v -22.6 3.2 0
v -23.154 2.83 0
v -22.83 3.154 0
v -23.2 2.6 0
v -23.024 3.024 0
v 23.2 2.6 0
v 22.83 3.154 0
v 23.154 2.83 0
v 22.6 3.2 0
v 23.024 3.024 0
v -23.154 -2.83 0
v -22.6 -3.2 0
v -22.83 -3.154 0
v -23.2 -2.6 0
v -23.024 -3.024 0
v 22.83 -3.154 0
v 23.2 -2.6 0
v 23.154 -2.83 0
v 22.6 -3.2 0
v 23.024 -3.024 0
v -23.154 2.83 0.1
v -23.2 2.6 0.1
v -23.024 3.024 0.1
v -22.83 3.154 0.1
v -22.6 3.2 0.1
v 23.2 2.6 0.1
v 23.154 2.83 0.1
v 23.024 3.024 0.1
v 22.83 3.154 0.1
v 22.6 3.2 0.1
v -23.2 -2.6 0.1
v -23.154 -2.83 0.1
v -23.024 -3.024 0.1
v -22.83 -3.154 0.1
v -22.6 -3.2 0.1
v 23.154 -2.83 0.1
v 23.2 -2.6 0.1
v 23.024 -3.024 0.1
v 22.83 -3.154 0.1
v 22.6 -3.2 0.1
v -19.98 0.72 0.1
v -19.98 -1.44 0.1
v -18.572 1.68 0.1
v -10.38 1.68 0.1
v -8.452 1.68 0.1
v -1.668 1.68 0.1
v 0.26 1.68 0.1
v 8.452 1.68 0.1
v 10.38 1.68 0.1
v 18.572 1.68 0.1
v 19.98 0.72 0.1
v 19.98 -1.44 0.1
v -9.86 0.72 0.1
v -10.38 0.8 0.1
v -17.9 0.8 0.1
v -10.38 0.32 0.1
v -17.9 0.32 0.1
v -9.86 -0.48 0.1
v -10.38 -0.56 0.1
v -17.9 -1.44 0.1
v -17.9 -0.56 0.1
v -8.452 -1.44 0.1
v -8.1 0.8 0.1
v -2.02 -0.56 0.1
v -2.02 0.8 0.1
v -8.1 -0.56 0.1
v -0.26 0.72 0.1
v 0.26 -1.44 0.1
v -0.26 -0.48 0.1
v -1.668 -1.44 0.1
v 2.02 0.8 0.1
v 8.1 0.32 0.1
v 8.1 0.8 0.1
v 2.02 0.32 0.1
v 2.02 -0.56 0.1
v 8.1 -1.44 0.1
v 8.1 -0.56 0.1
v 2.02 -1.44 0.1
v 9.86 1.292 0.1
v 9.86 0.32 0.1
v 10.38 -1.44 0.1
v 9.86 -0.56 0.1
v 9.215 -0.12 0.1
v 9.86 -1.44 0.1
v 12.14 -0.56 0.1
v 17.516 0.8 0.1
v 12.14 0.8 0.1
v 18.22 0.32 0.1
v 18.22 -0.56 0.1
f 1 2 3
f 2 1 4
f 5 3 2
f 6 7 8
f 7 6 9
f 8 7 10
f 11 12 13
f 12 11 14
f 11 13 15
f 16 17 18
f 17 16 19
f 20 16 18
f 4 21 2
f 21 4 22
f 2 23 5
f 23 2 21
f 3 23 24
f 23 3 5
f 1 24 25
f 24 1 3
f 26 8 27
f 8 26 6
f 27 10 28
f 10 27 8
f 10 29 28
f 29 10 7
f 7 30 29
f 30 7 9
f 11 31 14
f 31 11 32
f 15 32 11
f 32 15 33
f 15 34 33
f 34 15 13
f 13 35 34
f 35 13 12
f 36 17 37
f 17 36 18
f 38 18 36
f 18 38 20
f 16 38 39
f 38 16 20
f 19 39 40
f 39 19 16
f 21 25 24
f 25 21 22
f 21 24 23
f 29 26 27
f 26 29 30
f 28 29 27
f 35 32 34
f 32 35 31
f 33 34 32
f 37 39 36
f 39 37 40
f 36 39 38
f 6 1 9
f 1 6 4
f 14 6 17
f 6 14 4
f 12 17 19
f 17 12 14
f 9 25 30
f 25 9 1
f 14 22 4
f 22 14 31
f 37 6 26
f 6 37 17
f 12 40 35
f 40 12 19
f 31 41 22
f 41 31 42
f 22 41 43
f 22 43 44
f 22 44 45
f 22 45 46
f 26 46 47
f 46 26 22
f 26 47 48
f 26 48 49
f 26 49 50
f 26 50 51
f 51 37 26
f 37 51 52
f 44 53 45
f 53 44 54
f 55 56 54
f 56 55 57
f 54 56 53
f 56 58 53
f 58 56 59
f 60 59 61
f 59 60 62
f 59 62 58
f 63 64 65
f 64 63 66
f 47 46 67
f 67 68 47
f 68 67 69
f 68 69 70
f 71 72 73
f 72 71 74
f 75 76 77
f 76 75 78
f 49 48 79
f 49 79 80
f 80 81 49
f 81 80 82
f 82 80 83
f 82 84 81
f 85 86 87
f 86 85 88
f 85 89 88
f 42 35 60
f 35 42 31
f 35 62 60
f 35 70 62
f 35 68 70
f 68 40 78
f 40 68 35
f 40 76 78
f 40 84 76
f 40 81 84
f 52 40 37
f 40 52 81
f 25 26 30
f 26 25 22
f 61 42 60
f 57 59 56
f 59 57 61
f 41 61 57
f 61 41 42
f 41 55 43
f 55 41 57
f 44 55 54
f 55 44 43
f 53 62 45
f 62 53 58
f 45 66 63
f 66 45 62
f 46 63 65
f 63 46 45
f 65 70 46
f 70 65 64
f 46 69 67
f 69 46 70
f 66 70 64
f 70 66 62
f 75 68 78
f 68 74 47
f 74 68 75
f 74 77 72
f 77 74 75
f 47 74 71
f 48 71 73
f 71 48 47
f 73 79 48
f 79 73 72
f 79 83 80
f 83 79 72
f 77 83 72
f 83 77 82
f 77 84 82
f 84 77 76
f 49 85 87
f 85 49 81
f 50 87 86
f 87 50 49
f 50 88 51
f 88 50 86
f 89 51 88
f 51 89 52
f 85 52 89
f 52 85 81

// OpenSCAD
// file: ../p/1-4cyli.scad
use <../lib.scad>
function ldraw_lib__1_4cyli() = [
// 0 Cylinder 0.25
// 0 Name: 1-4cyli.dat
// 0 Author: James Jessiman
// 0 !LDRAW_ORG Primitive UPDATE 2012-01
// 0 !LICENSE Licensed under CC BY 2.0 and CC BY 4.0 : see CAreadme.txt
// 
// 0 BFC CERTIFY CCW
  [0,"BFC","CERTIFY"],
  [0,"BFC","CCW"],
// 
// 0 !HISTORY 2002-03-23 [sbliss] Added BFC statement.
// 0 !HISTORY 2002-04-25 [PTadmin] Official Update 2002-02
// 0 !HISTORY 2007-06-22 [PTadmin] Header formatted for Contributor Agreement
// 0 !HISTORY 2008-07-01 [PTadmin] Official Update 2008-01
// 0 !HISTORY 2012-02-16 [Philo] Changed to CCW
// 0 !HISTORY 2012-03-30 [PTadmin] Official Update 2012-01
// 
// 
// 4 16 1 1 0 0.9239 1 0.3827 0.9239 0 0.3827 1 0 0
  [4,16,1,1,0,0.9239,1,0.3827,0.9239,0,0.3827,1,0,0],
// 5 24 1 0 0 1 1 0 0.9239 0 0.3827 1 0 -1
  [5,24,1,0,0,1,1,0,0.9239,0,0.3827,1,0,-1],
// 4 16 0.9239 1 0.3827 0.7071 1 0.7071 0.7071 0 0.7071 0.9239 0 0.3827
  [4,16,0.9239,1,0.3827,0.7071,1,0.7071,0.7071,0,0.7071,0.9239,0,0.3827],
// 5 24 0.9239 0 0.3827 0.9239 1 0.3827 0.7071 0 0.7071 1 0 0
  [5,24,0.9239,0,0.3827,0.9239,1,0.3827,0.7071,0,0.7071,1,0,0],
// 4 16 0.7071 1 0.7071 0.3827 1 0.9239 0.3827 0 0.9239 0.7071 0 0.7071
  [4,16,0.7071,1,0.7071,0.3827,1,0.9239,0.3827,0,0.9239,0.7071,0,0.7071],
// 5 24 0.7071 0 0.7071 0.7071 1 0.7071 0.3827 0 0.9239 0.9239 0 0.3827
  [5,24,0.7071,0,0.7071,0.7071,1,0.7071,0.3827,0,0.9239,0.9239,0,0.3827],
// 4 16 0.3827 1 0.9239 0 1 1 0 0 1 0.3827 0 0.9239
  [4,16,0.3827,1,0.9239,0,1,1,0,0,1,0.3827,0,0.9239],
// 5 24 0.3827 0 0.9239 0.3827 1 0.9239 0 0 1 0.7071 0 0.7071
  [5,24,0.3827,0,0.9239,0.3827,1,0.9239,0,0,1,0.7071,0,0.7071],
// 5 24 0 0 1 0 1 1 0.3827 0 0.9239 -1 0 1
  [5,24,0,0,1,0,1,1,0.3827,0,0.9239,-1,0,1],
];
module ldraw_lib__1_4cyli(step=0, col=false, unit=2/5, alt=false, line=0.2, solid=!$preview)
    makepoly(ldraw_lib__1_4cyli(), step=step, col=col, unit=unit, alt=alt, line=line, solid=solid);
ldraw_lib__1_4cyli(line=0.2);
// file: ../p/1-4chrd.scad
use <../lib.scad>
function ldraw_lib__1_4chrd() = [
// 0 Chord 0.25
// 0 Name: 1-4chrd.dat
// 0 Author: Tony Hafner [hafhead]
// 0 !LDRAW_ORG Primitive UPDATE 2012-02
// 0 !LICENSE Licensed under CC BY 2.0 and CC BY 4.0 : see CAreadme.txt
// 
// 0 BFC CERTIFY CCW
  [0,"BFC","CERTIFY"],
  [0,"BFC","CCW"],
// 
// 0 !HISTORY 2004-04-22 [PTadmin] Official Update 2004-02
// 0 !HISTORY 2007-10-09 [PTadmin] Header formatted for Contributor Agreement
// 0 !HISTORY 2008-07-01 [PTadmin] Official Update 2008-01
// 0 !HISTORY 2012-08-02 [MMR1988] Re-creation with PrimGen2 and Rectifier
// 0 !HISTORY 2012-08-09 [PTadmin] Official Update 2012-02
// 
// 
// 4 16 0.9239 0 0.3827 0.3827 0 0.9239 0 0 1 1 0 0
  [4,16,0.9239,0,0.3827,0.3827,0,0.9239,0,0,1,1,0,0],
// 3 16 0.7071 0 0.7071 0.3827 0 0.9239 0.9239 0 0.3827
  [3,16,0.7071,0,0.7071,0.3827,0,0.9239,0.9239,0,0.3827],
];
module ldraw_lib__1_4chrd(step=0, col=false, unit=2/5, alt=false, line=0.2, solid=!$preview)
    makepoly(ldraw_lib__1_4chrd(), step=step, col=col, unit=unit, alt=alt, line=line, solid=solid);
ldraw_lib__1_4chrd(line=0.2);
// main file
use <../lib.scad>
use <../p/1-4chrd.scad>
use <../p/1-4cyli.scad>
function ldraw_lib__6141875f() = [
// 0 Sticker  0.8 x  5.8 with Light Grey FORD in Black Stripe on Blue Background
// 0 Name: 6141875f.dat
// 0 Author: Massimo Maso [Sirio]
// 0 !LDRAW_ORG Part UPDATE 2022-06
// 0 !LICENSE Licensed under CC BY 2.0 and CC BY 4.0 : see CAreadme.txt
// 
// 0 BFC CERTIFY CCW
  [0,"BFC","CERTIFY"],
  [0,"BFC","CCW"],
// 
// 0 !KEYWORDS Bricklink 75875stk01, Brickowl 53567, F-150, Raptor
// 0 !KEYWORDS Rebrickable 24760, Set 75875, Speed Champions
// 
// 0 !HISTORY 2022-12-20 [PTadmin] Official Update 2022-06
// 
// 
// 0 // Primitives
// 
// 1 16 -56.5 0 6.5 -1.5 0 0 0 -1 0 0 0 1.5 1-4chrd.dat
  [1,16,-56.5,0,6.5,-1.5,0,0,0,-1,0,0,0,1.5, ldraw_lib__1_4chrd()],
// 1 16 56.5 0 6.5 1.5 0 0 0 -1 0 0 0 1.5 1-4chrd.dat
  [1,16,56.5,0,6.5,1.5,0,0,0,-1,0,0,0,1.5, ldraw_lib__1_4chrd()],
// 1 16 -56.5 0 -6.5 -1.5 0 0 0 -1 0 0 0 -1.5 1-4chrd.dat
  [1,16,-56.5,0,-6.5,-1.5,0,0,0,-1,0,0,0,-1.5, ldraw_lib__1_4chrd()],
// 1 16 56.5 0 -6.5 1.5 0 0 0 -1 0 0 0 -1.5 1-4chrd.dat
  [1,16,56.5,0,-6.5,1.5,0,0,0,-1,0,0,0,-1.5, ldraw_lib__1_4chrd()],
// 1 16 -56.5 0 6.5 -1.5 0 0 0 -.25 0 0 0 1.5 1-4cyli.dat
  [1,16,-56.5,0,6.5,-1.5,0,0,0,-.25,0,0,0,1.5, ldraw_lib__1_4cyli()],
// 1 16 56.5 0 6.5 1.5 0 0 0 -.25 0 0 0 1.5 1-4cyli.dat
  [1,16,56.5,0,6.5,1.5,0,0,0,-.25,0,0,0,1.5, ldraw_lib__1_4cyli()],
// 1 16 -56.5 0 -6.5 -1.5 0 0 0 -.25 0 0 0 -1.5 1-4cyli.dat
  [1,16,-56.5,0,-6.5,-1.5,0,0,0,-.25,0,0,0,-1.5, ldraw_lib__1_4cyli()],
// 1 16 56.5 0 -6.5 1.5 0 0 0 -.25 0 0 0 -1.5 1-4cyli.dat
  [1,16,56.5,0,-6.5,1.5,0,0,0,-.25,0,0,0,-1.5, ldraw_lib__1_4cyli()],
// 1 1 -56.5 -.25 6.5 -1.5 0 0 0 1 0 0 0 1.5 1-4chrd.dat
  [1,1,-56.5,-.25,6.5,-1.5,0,0,0,1,0,0,0,1.5, ldraw_lib__1_4chrd()],
// 1 1 56.5 -.25 6.5 1.5 0 0 0 1 0 0 0 1.5 1-4chrd.dat
  [1,1,56.5,-.25,6.5,1.5,0,0,0,1,0,0,0,1.5, ldraw_lib__1_4chrd()],
// 1 0 -56.5 -.25 -6.5 -1.5 0 0 0 1 0 0 0 -1.5 1-4chrd.dat
  [1,0,-56.5,-.25,-6.5,-1.5,0,0,0,1,0,0,0,-1.5, ldraw_lib__1_4chrd()],
// 1 0 56.5 -.25 -6.5 1.5 0 0 0 1 0 0 0 -1.5 1-4chrd.dat
  [1,0,56.5,-.25,-6.5,1.5,0,0,0,1,0,0,0,-1.5, ldraw_lib__1_4chrd()],
// 0 // Bottom face
// 4 16 56.5 0 8 58 0 6.5 -58 0 6.5 -56.5 0 8
  [4,16,56.5,0,8,58,0,6.5,-58,0,6.5,-56.5,0,8],
// 4 16 58 0 6.5 58 0 -6.5 -58 0 -6.5 -58 0 6.5
  [4,16,58,0,6.5,58,0,-6.5,-58,0,-6.5,-58,0,6.5],
// 4 16 56.5 0 -8 -56.5 0 -8 -58 0 -6.5 58 0 -6.5
  [4,16,56.5,0,-8,-56.5,0,-8,-58,0,-6.5,58,0,-6.5],
// 0 // Lateral face
// 4 16 -56.5 0 8 -56.5 -.25 8 56.5 -.25 8 56.5 0 8
  [4,16,-56.5,0,8,-56.5,-.25,8,56.5,-.25,8,56.5,0,8],
// 4 16 -58 0 6.5 -58 0 -6.5 -58 -.25 -6.5 -58 -.25 6.5
  [4,16,-58,0,6.5,-58,0,-6.5,-58,-.25,-6.5,-58,-.25,6.5],
// 4 16 58 0 6.5 58 -.25 6.5 58 -.25 -6.5 58 0 -6.5
  [4,16,58,0,6.5,58,-.25,6.5,58,-.25,-6.5,58,0,-6.5],
// 4 16 -56.5 0 -8 56.5 0 -8 56.5 -.25 -8 -56.5 -.25 -8
  [4,16,-56.5,0,-8,56.5,0,-8,56.5,-.25,-8,-56.5,-.25,-8],
// 0 // Top face
// 0 // Black faces
// 4 0 -58 -.25 6.5 -58 -.25 -6.5 -49.95 -.25 -3.6 -49.95 -.25 1.8
  [4,0,-58,-.25,6.5,-58,-.25,-6.5,-49.95,-.25,-3.6,-49.95,-.25,1.8],
// 3 0 -58 -.25 6.5 -49.95 -.25 1.8 -46.43 -.25 4.2
  [3,0,-58,-.25,6.5,-49.95,-.25,1.8,-46.43,-.25,4.2],
// 3 0 -58 -.25 6.5 -46.43 -.25 4.2 -25.95 -.25 4.2
  [3,0,-58,-.25,6.5,-46.43,-.25,4.2,-25.95,-.25,4.2],
// 3 0 -58 -.25 6.5 -25.95 -.25 4.2 -21.13 -.25 4.2
  [3,0,-58,-.25,6.5,-25.95,-.25,4.2,-21.13,-.25,4.2],
// 3 0 -58 -.25 6.5 -21.13 -.25 4.2 -4.17 -.25 4.2
  [3,0,-58,-.25,6.5,-21.13,-.25,4.2,-4.17,-.25,4.2],
// 4 0 -58 -.25 6.5 -4.17 -.25 4.2 .65 -.25 4.2 58 -.25 6.5
  [4,0,-58,-.25,6.5,-4.17,-.25,4.2,.65,-.25,4.2,58,-.25,6.5],
// 3 0 58 -.25 6.5 .65 -.25 4.2 21.13 -.25 4.2
  [3,0,58,-.25,6.5,.65,-.25,4.2,21.13,-.25,4.2],
// 3 0 58 -.25 6.5 21.13 -.25 4.2 25.95 -.25 4.2
  [3,0,58,-.25,6.5,21.13,-.25,4.2,25.95,-.25,4.2],
// 3 0 58 -.25 6.5 25.95 -.25 4.2 46.43 -.25 4.2
  [3,0,58,-.25,6.5,25.95,-.25,4.2,46.43,-.25,4.2],
// 3 0 58 -.25 6.5 46.43 -.25 4.2 49.95 -.25 1.8
  [3,0,58,-.25,6.5,46.43,-.25,4.2,49.95,-.25,1.8],
// 4 0 58 -.25 6.5 49.95 -.25 1.8 49.95 -.25 -3.6 58 -.25 -6.5
  [4,0,58,-.25,6.5,49.95,-.25,1.8,49.95,-.25,-3.6,58,-.25,-6.5],
// 4 0 -25.95 -.25 2 -24.65 -.25 1.8 -21.13 -.25 4.2 -25.95 -.25 4.2
  [4,0,-25.95,-.25,2,-24.65,-.25,1.8,-21.13,-.25,4.2,-25.95,-.25,4.2],
// 4 0 -25.95 -.25 2 -44.75 -.25 2 -44.75 -.25 .8 -25.95 -.25 .8
  [4,0,-25.95,-.25,2,-44.75,-.25,2,-44.75,-.25,.8,-25.95,-.25,.8],
// 3 0 -25.95 -.25 2 -25.95 -.25 .8 -24.65 -.25 1.8
  [3,0,-25.95,-.25,2,-25.95,-.25,.8,-24.65,-.25,1.8],
// 4 0 -25.95 -.25 -1.4 -24.65 -.25 -1.2 -24.65 -.25 1.8 -25.95 -.25 .8
  [4,0,-25.95,-.25,-1.4,-24.65,-.25,-1.2,-24.65,-.25,1.8,-25.95,-.25,.8],
// 4 0 -25.95 -.25 -1.4 -44.75 -.25 -1.4 -44.75 -.25 -3.6 -21.13 -.25 -3.6
  [4,0,-25.95,-.25,-1.4,-44.75,-.25,-1.4,-44.75,-.25,-3.6,-21.13,-.25,-3.6],
// 3 0 -25.95 -.25 -1.4 -21.13 -.25 -3.6 -24.65 -.25 -1.2
  [3,0,-25.95,-.25,-1.4,-21.13,-.25,-3.6,-24.65,-.25,-1.2],
// 4 0 -20.25 -.25 2 -20.25 -.25 -1.4 -5.05 -.25 -1.4 -5.05 -.25 2
  [4,0,-20.25,-.25,2,-20.25,-.25,-1.4,-5.05,-.25,-1.4,-5.05,-.25,2],
// 3 0 .65 -.25 4.2 -4.17 -.25 4.2 -.65 -.25 1.8
  [3,0,.65,-.25,4.2,-4.17,-.25,4.2,-.65,-.25,1.8],
// 4 0 .65 -.25 4.2 -.65 -.25 1.8 -.65 -.25 -1.2 .65 -.25 -3.6
  [4,0,.65,-.25,4.2,-.65,-.25,1.8,-.65,-.25,-1.2,.65,-.25,-3.6],
// 3 0 .65 -.25 -3.6 -.65 -.25 -1.2 -4.17 -.25 -3.6
  [3,0,.65,-.25,-3.6,-.65,-.25,-1.2,-4.17,-.25,-3.6],
// 4 0 5.05 -.25 2 5.05 -.25 .8 20.25 -.25 .8 20.25 -.25 2
  [4,0,5.05,-.25,2,5.05,-.25,.8,20.25,-.25,.8,20.25,-.25,2],
// 4 0 5.05 -.25 -1.4 5.05 -.25 -3.6 20.25 -.25 -3.6 20.25 -.25 -1.4
  [4,0,5.05,-.25,-1.4,5.05,-.25,-3.6,20.25,-.25,-3.6,20.25,-.25,-1.4],
// 3 0 25.95 -.25 4.2 21.13 -.25 4.2 24.65 -.25 3.23
  [3,0,25.95,-.25,4.2,21.13,-.25,4.2,24.65,-.25,3.23],
// 3 0 25.95 -.25 4.2 24.65 -.25 3.23 24.65 -.25 .8
  [3,0,25.95,-.25,4.2,24.65,-.25,3.23,24.65,-.25,.8],
// 4 0 25.95 -.25 4.2 24.65 -.25 .8 24.65 -.25 -1.4 25.95 -.25 -3.6
  [4,0,25.95,-.25,4.2,24.65,-.25,.8,24.65,-.25,-1.4,25.95,-.25,-3.6],
// 3 0 24.65 -.25 -1.4 24.65 -.25 .8 23.0367 -.25 -.3
  [3,0,24.65,-.25,-1.4,24.65,-.25,.8,23.0367,-.25,-.3],
// 3 0 24.65 -.25 -1.4 24.65 -.25 -3.6 25.95 -.25 -3.6
  [3,0,24.65,-.25,-1.4,24.65,-.25,-3.6,25.95,-.25,-3.6],
// 4 0 30.35 -.25 -1.4 45.55 -.25 .8 43.79 -.25 2 30.35 -.25 2
  [4,0,30.35,-.25,-1.4,45.55,-.25,.8,43.79,-.25,2,30.35,-.25,2],
// 3 0 30.35 -.25 -1.4 45.55 -.25 -1.4 45.55 -.25 .8
  [3,0,30.35,-.25,-1.4,45.55,-.25,-1.4,45.55,-.25,.8],
// 4 0 -56.5 -.25 -8 -44.75 -.25 -3.6 -49.95 -.25 -3.6 -58 -.25 -6.5
  [4,0,-56.5,-.25,-8,-44.75,-.25,-3.6,-49.95,-.25,-3.6,-58,-.25,-6.5],
// 3 0 -56.5 -.25 -8 -21.13 -.25 -3.6 -44.75 -.25 -3.6
  [3,0,-56.5,-.25,-8,-21.13,-.25,-3.6,-44.75,-.25,-3.6],
// 3 0 -56.5 -.25 -8 -4.17 -.25 -3.6 -21.13 -.25 -3.6
  [3,0,-56.5,-.25,-8,-4.17,-.25,-3.6,-21.13,-.25,-3.6],
// 3 0 -56.5 -.25 -8 .65 -.25 -3.6 -4.17 -.25 -3.6
  [3,0,-56.5,-.25,-8,.65,-.25,-3.6,-4.17,-.25,-3.6],
// 4 0 -56.5 -.25 -8 56.5 -.25 -8 5.05 -.25 -3.6 .65 -.25 -3.6
  [4,0,-56.5,-.25,-8,56.5,-.25,-8,5.05,-.25,-3.6,.65,-.25,-3.6],
// 3 0 56.5 -.25 -8 20.25 -.25 -3.6 5.05 -.25 -3.6
  [3,0,56.5,-.25,-8,20.25,-.25,-3.6,5.05,-.25,-3.6],
// 3 0 56.5 -.25 -8 24.65 -.25 -3.6 20.25 -.25 -3.6
  [3,0,56.5,-.25,-8,24.65,-.25,-3.6,20.25,-.25,-3.6],
// 3 0 56.5 -.25 -8 25.95 -.25 -3.6 24.65 -.25 -3.6
  [3,0,56.5,-.25,-8,25.95,-.25,-3.6,24.65,-.25,-3.6],
// 4 0 56.5 -.25 -8 58 -.25 -6.5 49.95 -.25 -3.6 25.95 -.25 -3.6
  [4,0,56.5,-.25,-8,58,-.25,-6.5,49.95,-.25,-3.6,25.95,-.25,-3.6],
// 0 // Blue face
// 4 1 -58 -.25 6.5 58 -.25 6.5 56.5 -.25 8 -56.5 -.25 8
  [4,1,-58,-.25,6.5,58,-.25,6.5,56.5,-.25,8,-56.5,-.25,8],
// 0 // Light grey text "FORD"
// 0 // Letter "F"
// 3 71 -44.75 -.25 -1.4 -49.95 -.25 -3.6 -44.75 -.25 -3.6
  [3,71,-44.75,-.25,-1.4,-49.95,-.25,-3.6,-44.75,-.25,-3.6],
// 4 71 -44.75 -.25 -1.4 -25.95 -.25 -1.4 -25.95 -.25 .8 -44.75 -.25 .8
  [4,71,-44.75,-.25,-1.4,-25.95,-.25,-1.4,-25.95,-.25,.8,-44.75,-.25,.8],
// 4 71 -44.75 -.25 -1.4 -44.75 -.25 .8 -49.95 -.25 1.8 -49.95 -.25 -3.6
  [4,71,-44.75,-.25,-1.4,-44.75,-.25,.8,-49.95,-.25,1.8,-49.95,-.25,-3.6],
// 4 71 -44.75 -.25 2 -46.43 -.25 4.2 -49.95 -.25 1.8 -44.75 -.25 .8
  [4,71,-44.75,-.25,2,-46.43,-.25,4.2,-49.95,-.25,1.8,-44.75,-.25,.8],
// 4 71 -44.75 -.25 2 -25.95 -.25 2 -25.95 -.25 4.2 -46.43 -.25 4.2
  [4,71,-44.75,-.25,2,-25.95,-.25,2,-25.95,-.25,4.2,-46.43,-.25,4.2],
// 0 // Letter "O"
// 4 71 -21.13 -.25 4.2 -24.65 -.25 1.8 -24.65 -.25 -1.2 -21.13 -.25 -3.6
  [4,71,-21.13,-.25,4.2,-24.65,-.25,1.8,-24.65,-.25,-1.2,-21.13,-.25,-3.6],
// 4 71 -21.13 -.25 4.2 -21.13 -.25 -3.6 -20.25 -.25 -1.4 -20.25 -.25 2
  [4,71,-21.13,-.25,4.2,-21.13,-.25,-3.6,-20.25,-.25,-1.4,-20.25,-.25,2],
// 4 71 -21.13 -.25 4.2 -20.25 -.25 2 -5.05 -.25 2 -4.17 -.25 4.2
  [4,71,-21.13,-.25,4.2,-20.25,-.25,2,-5.05,-.25,2,-4.17,-.25,4.2],
// 4 71 -4.17 -.25 -3.6 -4.17 -.25 4.2 -5.05 -.25 2 -5.05 -.25 -1.4
  [4,71,-4.17,-.25,-3.6,-4.17,-.25,4.2,-5.05,-.25,2,-5.05,-.25,-1.4],
// 4 71 -4.17 -.25 -3.6 -.65 -.25 -1.2 -.65 -.25 1.8 -4.17 -.25 4.2
  [4,71,-4.17,-.25,-3.6,-.65,-.25,-1.2,-.65,-.25,1.8,-4.17,-.25,4.2],
// 4 71 -4.17 -.25 -3.6 -5.05 -.25 -1.4 -20.25 -.25 -1.4 -21.13 -.25 -3.6
  [4,71,-4.17,-.25,-3.6,-5.05,-.25,-1.4,-20.25,-.25,-1.4,-21.13,-.25,-3.6],
// 0 // Letter "R"
// 3 71 5.05 -.25 -1.4 .65 -.25 -3.6 5.05 -.25 -3.6
  [3,71,5.05,-.25,-1.4,.65,-.25,-3.6,5.05,-.25,-3.6],
// 4 71 5.05 -.25 -1.4 5.05 -.25 .8 .65 -.25 4.2 .65 -.25 -3.6
  [4,71,5.05,-.25,-1.4,5.05,-.25,.8,.65,-.25,4.2,.65,-.25,-3.6],
// 4 71 5.05 -.25 -1.4 20.25 -.25 -1.4 20.25 -.25 .8 5.05 -.25 .8
  [4,71,5.05,-.25,-1.4,20.25,-.25,-1.4,20.25,-.25,.8,5.05,-.25,.8],
// 3 71 .65 -.25 4.2 5.05 -.25 .8 5.05 -.25 2
  [3,71,.65,-.25,4.2,5.05,-.25,.8,5.05,-.25,2],
// 4 71 .65 -.25 4.2 5.05 -.25 2 20.25 -.25 2 21.13 -.25 4.2
  [4,71,.65,-.25,4.2,5.05,-.25,2,20.25,-.25,2,21.13,-.25,4.2],
// 4 71 20.25 -.25 .8 24.65 -.25 3.23 21.13 -.25 4.2 20.25 -.25 2
  [4,71,20.25,-.25,.8,24.65,-.25,3.23,21.13,-.25,4.2,20.25,-.25,2],
// 4 71 20.25 -.25 .8 23.0367 -.25 -.3 24.65 -.25 .8 24.65 -.25 3.23
  [4,71,20.25,-.25,.8,23.0367,-.25,-.3,24.65,-.25,.8,24.65,-.25,3.23],
// 4 71 20.25 -.25 -1.4 24.65 -.25 -1.4 23.0367 -.25 -.3 20.25 -.25 .8
  [4,71,20.25,-.25,-1.4,24.65,-.25,-1.4,23.0367,-.25,-.3,20.25,-.25,.8],
// 4 71 20.25 -.25 -1.4 20.25 -.25 -3.6 24.65 -.25 -3.6 24.65 -.25 -1.4
  [4,71,20.25,-.25,-1.4,20.25,-.25,-3.6,24.65,-.25,-3.6,24.65,-.25,-1.4],
// 0 // Letter "D"
// 4 71 30.35 -.25 2 25.95 -.25 4.2 25.95 -.25 -3.6 30.35 -.25 -1.4
  [4,71,30.35,-.25,2,25.95,-.25,4.2,25.95,-.25,-3.6,30.35,-.25,-1.4],
// 4 71 30.35 -.25 2 43.79 -.25 2 46.43 -.25 4.2 25.95 -.25 4.2
  [4,71,30.35,-.25,2,43.79,-.25,2,46.43,-.25,4.2,25.95,-.25,4.2],
// 4 71 45.55 -.25 .8 49.95 -.25 1.8 46.43 -.25 4.2 43.79 -.25 2
  [4,71,45.55,-.25,.8,49.95,-.25,1.8,46.43,-.25,4.2,43.79,-.25,2],
// 4 71 45.55 -.25 .8 45.55 -.25 -1.4 49.95 -.25 -3.6 49.95 -.25 1.8
  [4,71,45.55,-.25,.8,45.55,-.25,-1.4,49.95,-.25,-3.6,49.95,-.25,1.8],
// 4 71 25.95 -.25 -3.6 49.95 -.25 -3.6 45.55 -.25 -1.4 30.35 -.25 -1.4
  [4,71,25.95,-.25,-3.6,49.95,-.25,-3.6,45.55,-.25,-1.4,30.35,-.25,-1.4],
];
module ldraw_lib__6141875f(step=0, col=false, unit=2/5, alt=false, line=0.2, solid=!$preview)
    makepoly(ldraw_lib__6141875f(), step=step, col=col, unit=unit, alt=alt, line=line, solid=solid);
ldraw_lib__6141875f(line=0.2);
